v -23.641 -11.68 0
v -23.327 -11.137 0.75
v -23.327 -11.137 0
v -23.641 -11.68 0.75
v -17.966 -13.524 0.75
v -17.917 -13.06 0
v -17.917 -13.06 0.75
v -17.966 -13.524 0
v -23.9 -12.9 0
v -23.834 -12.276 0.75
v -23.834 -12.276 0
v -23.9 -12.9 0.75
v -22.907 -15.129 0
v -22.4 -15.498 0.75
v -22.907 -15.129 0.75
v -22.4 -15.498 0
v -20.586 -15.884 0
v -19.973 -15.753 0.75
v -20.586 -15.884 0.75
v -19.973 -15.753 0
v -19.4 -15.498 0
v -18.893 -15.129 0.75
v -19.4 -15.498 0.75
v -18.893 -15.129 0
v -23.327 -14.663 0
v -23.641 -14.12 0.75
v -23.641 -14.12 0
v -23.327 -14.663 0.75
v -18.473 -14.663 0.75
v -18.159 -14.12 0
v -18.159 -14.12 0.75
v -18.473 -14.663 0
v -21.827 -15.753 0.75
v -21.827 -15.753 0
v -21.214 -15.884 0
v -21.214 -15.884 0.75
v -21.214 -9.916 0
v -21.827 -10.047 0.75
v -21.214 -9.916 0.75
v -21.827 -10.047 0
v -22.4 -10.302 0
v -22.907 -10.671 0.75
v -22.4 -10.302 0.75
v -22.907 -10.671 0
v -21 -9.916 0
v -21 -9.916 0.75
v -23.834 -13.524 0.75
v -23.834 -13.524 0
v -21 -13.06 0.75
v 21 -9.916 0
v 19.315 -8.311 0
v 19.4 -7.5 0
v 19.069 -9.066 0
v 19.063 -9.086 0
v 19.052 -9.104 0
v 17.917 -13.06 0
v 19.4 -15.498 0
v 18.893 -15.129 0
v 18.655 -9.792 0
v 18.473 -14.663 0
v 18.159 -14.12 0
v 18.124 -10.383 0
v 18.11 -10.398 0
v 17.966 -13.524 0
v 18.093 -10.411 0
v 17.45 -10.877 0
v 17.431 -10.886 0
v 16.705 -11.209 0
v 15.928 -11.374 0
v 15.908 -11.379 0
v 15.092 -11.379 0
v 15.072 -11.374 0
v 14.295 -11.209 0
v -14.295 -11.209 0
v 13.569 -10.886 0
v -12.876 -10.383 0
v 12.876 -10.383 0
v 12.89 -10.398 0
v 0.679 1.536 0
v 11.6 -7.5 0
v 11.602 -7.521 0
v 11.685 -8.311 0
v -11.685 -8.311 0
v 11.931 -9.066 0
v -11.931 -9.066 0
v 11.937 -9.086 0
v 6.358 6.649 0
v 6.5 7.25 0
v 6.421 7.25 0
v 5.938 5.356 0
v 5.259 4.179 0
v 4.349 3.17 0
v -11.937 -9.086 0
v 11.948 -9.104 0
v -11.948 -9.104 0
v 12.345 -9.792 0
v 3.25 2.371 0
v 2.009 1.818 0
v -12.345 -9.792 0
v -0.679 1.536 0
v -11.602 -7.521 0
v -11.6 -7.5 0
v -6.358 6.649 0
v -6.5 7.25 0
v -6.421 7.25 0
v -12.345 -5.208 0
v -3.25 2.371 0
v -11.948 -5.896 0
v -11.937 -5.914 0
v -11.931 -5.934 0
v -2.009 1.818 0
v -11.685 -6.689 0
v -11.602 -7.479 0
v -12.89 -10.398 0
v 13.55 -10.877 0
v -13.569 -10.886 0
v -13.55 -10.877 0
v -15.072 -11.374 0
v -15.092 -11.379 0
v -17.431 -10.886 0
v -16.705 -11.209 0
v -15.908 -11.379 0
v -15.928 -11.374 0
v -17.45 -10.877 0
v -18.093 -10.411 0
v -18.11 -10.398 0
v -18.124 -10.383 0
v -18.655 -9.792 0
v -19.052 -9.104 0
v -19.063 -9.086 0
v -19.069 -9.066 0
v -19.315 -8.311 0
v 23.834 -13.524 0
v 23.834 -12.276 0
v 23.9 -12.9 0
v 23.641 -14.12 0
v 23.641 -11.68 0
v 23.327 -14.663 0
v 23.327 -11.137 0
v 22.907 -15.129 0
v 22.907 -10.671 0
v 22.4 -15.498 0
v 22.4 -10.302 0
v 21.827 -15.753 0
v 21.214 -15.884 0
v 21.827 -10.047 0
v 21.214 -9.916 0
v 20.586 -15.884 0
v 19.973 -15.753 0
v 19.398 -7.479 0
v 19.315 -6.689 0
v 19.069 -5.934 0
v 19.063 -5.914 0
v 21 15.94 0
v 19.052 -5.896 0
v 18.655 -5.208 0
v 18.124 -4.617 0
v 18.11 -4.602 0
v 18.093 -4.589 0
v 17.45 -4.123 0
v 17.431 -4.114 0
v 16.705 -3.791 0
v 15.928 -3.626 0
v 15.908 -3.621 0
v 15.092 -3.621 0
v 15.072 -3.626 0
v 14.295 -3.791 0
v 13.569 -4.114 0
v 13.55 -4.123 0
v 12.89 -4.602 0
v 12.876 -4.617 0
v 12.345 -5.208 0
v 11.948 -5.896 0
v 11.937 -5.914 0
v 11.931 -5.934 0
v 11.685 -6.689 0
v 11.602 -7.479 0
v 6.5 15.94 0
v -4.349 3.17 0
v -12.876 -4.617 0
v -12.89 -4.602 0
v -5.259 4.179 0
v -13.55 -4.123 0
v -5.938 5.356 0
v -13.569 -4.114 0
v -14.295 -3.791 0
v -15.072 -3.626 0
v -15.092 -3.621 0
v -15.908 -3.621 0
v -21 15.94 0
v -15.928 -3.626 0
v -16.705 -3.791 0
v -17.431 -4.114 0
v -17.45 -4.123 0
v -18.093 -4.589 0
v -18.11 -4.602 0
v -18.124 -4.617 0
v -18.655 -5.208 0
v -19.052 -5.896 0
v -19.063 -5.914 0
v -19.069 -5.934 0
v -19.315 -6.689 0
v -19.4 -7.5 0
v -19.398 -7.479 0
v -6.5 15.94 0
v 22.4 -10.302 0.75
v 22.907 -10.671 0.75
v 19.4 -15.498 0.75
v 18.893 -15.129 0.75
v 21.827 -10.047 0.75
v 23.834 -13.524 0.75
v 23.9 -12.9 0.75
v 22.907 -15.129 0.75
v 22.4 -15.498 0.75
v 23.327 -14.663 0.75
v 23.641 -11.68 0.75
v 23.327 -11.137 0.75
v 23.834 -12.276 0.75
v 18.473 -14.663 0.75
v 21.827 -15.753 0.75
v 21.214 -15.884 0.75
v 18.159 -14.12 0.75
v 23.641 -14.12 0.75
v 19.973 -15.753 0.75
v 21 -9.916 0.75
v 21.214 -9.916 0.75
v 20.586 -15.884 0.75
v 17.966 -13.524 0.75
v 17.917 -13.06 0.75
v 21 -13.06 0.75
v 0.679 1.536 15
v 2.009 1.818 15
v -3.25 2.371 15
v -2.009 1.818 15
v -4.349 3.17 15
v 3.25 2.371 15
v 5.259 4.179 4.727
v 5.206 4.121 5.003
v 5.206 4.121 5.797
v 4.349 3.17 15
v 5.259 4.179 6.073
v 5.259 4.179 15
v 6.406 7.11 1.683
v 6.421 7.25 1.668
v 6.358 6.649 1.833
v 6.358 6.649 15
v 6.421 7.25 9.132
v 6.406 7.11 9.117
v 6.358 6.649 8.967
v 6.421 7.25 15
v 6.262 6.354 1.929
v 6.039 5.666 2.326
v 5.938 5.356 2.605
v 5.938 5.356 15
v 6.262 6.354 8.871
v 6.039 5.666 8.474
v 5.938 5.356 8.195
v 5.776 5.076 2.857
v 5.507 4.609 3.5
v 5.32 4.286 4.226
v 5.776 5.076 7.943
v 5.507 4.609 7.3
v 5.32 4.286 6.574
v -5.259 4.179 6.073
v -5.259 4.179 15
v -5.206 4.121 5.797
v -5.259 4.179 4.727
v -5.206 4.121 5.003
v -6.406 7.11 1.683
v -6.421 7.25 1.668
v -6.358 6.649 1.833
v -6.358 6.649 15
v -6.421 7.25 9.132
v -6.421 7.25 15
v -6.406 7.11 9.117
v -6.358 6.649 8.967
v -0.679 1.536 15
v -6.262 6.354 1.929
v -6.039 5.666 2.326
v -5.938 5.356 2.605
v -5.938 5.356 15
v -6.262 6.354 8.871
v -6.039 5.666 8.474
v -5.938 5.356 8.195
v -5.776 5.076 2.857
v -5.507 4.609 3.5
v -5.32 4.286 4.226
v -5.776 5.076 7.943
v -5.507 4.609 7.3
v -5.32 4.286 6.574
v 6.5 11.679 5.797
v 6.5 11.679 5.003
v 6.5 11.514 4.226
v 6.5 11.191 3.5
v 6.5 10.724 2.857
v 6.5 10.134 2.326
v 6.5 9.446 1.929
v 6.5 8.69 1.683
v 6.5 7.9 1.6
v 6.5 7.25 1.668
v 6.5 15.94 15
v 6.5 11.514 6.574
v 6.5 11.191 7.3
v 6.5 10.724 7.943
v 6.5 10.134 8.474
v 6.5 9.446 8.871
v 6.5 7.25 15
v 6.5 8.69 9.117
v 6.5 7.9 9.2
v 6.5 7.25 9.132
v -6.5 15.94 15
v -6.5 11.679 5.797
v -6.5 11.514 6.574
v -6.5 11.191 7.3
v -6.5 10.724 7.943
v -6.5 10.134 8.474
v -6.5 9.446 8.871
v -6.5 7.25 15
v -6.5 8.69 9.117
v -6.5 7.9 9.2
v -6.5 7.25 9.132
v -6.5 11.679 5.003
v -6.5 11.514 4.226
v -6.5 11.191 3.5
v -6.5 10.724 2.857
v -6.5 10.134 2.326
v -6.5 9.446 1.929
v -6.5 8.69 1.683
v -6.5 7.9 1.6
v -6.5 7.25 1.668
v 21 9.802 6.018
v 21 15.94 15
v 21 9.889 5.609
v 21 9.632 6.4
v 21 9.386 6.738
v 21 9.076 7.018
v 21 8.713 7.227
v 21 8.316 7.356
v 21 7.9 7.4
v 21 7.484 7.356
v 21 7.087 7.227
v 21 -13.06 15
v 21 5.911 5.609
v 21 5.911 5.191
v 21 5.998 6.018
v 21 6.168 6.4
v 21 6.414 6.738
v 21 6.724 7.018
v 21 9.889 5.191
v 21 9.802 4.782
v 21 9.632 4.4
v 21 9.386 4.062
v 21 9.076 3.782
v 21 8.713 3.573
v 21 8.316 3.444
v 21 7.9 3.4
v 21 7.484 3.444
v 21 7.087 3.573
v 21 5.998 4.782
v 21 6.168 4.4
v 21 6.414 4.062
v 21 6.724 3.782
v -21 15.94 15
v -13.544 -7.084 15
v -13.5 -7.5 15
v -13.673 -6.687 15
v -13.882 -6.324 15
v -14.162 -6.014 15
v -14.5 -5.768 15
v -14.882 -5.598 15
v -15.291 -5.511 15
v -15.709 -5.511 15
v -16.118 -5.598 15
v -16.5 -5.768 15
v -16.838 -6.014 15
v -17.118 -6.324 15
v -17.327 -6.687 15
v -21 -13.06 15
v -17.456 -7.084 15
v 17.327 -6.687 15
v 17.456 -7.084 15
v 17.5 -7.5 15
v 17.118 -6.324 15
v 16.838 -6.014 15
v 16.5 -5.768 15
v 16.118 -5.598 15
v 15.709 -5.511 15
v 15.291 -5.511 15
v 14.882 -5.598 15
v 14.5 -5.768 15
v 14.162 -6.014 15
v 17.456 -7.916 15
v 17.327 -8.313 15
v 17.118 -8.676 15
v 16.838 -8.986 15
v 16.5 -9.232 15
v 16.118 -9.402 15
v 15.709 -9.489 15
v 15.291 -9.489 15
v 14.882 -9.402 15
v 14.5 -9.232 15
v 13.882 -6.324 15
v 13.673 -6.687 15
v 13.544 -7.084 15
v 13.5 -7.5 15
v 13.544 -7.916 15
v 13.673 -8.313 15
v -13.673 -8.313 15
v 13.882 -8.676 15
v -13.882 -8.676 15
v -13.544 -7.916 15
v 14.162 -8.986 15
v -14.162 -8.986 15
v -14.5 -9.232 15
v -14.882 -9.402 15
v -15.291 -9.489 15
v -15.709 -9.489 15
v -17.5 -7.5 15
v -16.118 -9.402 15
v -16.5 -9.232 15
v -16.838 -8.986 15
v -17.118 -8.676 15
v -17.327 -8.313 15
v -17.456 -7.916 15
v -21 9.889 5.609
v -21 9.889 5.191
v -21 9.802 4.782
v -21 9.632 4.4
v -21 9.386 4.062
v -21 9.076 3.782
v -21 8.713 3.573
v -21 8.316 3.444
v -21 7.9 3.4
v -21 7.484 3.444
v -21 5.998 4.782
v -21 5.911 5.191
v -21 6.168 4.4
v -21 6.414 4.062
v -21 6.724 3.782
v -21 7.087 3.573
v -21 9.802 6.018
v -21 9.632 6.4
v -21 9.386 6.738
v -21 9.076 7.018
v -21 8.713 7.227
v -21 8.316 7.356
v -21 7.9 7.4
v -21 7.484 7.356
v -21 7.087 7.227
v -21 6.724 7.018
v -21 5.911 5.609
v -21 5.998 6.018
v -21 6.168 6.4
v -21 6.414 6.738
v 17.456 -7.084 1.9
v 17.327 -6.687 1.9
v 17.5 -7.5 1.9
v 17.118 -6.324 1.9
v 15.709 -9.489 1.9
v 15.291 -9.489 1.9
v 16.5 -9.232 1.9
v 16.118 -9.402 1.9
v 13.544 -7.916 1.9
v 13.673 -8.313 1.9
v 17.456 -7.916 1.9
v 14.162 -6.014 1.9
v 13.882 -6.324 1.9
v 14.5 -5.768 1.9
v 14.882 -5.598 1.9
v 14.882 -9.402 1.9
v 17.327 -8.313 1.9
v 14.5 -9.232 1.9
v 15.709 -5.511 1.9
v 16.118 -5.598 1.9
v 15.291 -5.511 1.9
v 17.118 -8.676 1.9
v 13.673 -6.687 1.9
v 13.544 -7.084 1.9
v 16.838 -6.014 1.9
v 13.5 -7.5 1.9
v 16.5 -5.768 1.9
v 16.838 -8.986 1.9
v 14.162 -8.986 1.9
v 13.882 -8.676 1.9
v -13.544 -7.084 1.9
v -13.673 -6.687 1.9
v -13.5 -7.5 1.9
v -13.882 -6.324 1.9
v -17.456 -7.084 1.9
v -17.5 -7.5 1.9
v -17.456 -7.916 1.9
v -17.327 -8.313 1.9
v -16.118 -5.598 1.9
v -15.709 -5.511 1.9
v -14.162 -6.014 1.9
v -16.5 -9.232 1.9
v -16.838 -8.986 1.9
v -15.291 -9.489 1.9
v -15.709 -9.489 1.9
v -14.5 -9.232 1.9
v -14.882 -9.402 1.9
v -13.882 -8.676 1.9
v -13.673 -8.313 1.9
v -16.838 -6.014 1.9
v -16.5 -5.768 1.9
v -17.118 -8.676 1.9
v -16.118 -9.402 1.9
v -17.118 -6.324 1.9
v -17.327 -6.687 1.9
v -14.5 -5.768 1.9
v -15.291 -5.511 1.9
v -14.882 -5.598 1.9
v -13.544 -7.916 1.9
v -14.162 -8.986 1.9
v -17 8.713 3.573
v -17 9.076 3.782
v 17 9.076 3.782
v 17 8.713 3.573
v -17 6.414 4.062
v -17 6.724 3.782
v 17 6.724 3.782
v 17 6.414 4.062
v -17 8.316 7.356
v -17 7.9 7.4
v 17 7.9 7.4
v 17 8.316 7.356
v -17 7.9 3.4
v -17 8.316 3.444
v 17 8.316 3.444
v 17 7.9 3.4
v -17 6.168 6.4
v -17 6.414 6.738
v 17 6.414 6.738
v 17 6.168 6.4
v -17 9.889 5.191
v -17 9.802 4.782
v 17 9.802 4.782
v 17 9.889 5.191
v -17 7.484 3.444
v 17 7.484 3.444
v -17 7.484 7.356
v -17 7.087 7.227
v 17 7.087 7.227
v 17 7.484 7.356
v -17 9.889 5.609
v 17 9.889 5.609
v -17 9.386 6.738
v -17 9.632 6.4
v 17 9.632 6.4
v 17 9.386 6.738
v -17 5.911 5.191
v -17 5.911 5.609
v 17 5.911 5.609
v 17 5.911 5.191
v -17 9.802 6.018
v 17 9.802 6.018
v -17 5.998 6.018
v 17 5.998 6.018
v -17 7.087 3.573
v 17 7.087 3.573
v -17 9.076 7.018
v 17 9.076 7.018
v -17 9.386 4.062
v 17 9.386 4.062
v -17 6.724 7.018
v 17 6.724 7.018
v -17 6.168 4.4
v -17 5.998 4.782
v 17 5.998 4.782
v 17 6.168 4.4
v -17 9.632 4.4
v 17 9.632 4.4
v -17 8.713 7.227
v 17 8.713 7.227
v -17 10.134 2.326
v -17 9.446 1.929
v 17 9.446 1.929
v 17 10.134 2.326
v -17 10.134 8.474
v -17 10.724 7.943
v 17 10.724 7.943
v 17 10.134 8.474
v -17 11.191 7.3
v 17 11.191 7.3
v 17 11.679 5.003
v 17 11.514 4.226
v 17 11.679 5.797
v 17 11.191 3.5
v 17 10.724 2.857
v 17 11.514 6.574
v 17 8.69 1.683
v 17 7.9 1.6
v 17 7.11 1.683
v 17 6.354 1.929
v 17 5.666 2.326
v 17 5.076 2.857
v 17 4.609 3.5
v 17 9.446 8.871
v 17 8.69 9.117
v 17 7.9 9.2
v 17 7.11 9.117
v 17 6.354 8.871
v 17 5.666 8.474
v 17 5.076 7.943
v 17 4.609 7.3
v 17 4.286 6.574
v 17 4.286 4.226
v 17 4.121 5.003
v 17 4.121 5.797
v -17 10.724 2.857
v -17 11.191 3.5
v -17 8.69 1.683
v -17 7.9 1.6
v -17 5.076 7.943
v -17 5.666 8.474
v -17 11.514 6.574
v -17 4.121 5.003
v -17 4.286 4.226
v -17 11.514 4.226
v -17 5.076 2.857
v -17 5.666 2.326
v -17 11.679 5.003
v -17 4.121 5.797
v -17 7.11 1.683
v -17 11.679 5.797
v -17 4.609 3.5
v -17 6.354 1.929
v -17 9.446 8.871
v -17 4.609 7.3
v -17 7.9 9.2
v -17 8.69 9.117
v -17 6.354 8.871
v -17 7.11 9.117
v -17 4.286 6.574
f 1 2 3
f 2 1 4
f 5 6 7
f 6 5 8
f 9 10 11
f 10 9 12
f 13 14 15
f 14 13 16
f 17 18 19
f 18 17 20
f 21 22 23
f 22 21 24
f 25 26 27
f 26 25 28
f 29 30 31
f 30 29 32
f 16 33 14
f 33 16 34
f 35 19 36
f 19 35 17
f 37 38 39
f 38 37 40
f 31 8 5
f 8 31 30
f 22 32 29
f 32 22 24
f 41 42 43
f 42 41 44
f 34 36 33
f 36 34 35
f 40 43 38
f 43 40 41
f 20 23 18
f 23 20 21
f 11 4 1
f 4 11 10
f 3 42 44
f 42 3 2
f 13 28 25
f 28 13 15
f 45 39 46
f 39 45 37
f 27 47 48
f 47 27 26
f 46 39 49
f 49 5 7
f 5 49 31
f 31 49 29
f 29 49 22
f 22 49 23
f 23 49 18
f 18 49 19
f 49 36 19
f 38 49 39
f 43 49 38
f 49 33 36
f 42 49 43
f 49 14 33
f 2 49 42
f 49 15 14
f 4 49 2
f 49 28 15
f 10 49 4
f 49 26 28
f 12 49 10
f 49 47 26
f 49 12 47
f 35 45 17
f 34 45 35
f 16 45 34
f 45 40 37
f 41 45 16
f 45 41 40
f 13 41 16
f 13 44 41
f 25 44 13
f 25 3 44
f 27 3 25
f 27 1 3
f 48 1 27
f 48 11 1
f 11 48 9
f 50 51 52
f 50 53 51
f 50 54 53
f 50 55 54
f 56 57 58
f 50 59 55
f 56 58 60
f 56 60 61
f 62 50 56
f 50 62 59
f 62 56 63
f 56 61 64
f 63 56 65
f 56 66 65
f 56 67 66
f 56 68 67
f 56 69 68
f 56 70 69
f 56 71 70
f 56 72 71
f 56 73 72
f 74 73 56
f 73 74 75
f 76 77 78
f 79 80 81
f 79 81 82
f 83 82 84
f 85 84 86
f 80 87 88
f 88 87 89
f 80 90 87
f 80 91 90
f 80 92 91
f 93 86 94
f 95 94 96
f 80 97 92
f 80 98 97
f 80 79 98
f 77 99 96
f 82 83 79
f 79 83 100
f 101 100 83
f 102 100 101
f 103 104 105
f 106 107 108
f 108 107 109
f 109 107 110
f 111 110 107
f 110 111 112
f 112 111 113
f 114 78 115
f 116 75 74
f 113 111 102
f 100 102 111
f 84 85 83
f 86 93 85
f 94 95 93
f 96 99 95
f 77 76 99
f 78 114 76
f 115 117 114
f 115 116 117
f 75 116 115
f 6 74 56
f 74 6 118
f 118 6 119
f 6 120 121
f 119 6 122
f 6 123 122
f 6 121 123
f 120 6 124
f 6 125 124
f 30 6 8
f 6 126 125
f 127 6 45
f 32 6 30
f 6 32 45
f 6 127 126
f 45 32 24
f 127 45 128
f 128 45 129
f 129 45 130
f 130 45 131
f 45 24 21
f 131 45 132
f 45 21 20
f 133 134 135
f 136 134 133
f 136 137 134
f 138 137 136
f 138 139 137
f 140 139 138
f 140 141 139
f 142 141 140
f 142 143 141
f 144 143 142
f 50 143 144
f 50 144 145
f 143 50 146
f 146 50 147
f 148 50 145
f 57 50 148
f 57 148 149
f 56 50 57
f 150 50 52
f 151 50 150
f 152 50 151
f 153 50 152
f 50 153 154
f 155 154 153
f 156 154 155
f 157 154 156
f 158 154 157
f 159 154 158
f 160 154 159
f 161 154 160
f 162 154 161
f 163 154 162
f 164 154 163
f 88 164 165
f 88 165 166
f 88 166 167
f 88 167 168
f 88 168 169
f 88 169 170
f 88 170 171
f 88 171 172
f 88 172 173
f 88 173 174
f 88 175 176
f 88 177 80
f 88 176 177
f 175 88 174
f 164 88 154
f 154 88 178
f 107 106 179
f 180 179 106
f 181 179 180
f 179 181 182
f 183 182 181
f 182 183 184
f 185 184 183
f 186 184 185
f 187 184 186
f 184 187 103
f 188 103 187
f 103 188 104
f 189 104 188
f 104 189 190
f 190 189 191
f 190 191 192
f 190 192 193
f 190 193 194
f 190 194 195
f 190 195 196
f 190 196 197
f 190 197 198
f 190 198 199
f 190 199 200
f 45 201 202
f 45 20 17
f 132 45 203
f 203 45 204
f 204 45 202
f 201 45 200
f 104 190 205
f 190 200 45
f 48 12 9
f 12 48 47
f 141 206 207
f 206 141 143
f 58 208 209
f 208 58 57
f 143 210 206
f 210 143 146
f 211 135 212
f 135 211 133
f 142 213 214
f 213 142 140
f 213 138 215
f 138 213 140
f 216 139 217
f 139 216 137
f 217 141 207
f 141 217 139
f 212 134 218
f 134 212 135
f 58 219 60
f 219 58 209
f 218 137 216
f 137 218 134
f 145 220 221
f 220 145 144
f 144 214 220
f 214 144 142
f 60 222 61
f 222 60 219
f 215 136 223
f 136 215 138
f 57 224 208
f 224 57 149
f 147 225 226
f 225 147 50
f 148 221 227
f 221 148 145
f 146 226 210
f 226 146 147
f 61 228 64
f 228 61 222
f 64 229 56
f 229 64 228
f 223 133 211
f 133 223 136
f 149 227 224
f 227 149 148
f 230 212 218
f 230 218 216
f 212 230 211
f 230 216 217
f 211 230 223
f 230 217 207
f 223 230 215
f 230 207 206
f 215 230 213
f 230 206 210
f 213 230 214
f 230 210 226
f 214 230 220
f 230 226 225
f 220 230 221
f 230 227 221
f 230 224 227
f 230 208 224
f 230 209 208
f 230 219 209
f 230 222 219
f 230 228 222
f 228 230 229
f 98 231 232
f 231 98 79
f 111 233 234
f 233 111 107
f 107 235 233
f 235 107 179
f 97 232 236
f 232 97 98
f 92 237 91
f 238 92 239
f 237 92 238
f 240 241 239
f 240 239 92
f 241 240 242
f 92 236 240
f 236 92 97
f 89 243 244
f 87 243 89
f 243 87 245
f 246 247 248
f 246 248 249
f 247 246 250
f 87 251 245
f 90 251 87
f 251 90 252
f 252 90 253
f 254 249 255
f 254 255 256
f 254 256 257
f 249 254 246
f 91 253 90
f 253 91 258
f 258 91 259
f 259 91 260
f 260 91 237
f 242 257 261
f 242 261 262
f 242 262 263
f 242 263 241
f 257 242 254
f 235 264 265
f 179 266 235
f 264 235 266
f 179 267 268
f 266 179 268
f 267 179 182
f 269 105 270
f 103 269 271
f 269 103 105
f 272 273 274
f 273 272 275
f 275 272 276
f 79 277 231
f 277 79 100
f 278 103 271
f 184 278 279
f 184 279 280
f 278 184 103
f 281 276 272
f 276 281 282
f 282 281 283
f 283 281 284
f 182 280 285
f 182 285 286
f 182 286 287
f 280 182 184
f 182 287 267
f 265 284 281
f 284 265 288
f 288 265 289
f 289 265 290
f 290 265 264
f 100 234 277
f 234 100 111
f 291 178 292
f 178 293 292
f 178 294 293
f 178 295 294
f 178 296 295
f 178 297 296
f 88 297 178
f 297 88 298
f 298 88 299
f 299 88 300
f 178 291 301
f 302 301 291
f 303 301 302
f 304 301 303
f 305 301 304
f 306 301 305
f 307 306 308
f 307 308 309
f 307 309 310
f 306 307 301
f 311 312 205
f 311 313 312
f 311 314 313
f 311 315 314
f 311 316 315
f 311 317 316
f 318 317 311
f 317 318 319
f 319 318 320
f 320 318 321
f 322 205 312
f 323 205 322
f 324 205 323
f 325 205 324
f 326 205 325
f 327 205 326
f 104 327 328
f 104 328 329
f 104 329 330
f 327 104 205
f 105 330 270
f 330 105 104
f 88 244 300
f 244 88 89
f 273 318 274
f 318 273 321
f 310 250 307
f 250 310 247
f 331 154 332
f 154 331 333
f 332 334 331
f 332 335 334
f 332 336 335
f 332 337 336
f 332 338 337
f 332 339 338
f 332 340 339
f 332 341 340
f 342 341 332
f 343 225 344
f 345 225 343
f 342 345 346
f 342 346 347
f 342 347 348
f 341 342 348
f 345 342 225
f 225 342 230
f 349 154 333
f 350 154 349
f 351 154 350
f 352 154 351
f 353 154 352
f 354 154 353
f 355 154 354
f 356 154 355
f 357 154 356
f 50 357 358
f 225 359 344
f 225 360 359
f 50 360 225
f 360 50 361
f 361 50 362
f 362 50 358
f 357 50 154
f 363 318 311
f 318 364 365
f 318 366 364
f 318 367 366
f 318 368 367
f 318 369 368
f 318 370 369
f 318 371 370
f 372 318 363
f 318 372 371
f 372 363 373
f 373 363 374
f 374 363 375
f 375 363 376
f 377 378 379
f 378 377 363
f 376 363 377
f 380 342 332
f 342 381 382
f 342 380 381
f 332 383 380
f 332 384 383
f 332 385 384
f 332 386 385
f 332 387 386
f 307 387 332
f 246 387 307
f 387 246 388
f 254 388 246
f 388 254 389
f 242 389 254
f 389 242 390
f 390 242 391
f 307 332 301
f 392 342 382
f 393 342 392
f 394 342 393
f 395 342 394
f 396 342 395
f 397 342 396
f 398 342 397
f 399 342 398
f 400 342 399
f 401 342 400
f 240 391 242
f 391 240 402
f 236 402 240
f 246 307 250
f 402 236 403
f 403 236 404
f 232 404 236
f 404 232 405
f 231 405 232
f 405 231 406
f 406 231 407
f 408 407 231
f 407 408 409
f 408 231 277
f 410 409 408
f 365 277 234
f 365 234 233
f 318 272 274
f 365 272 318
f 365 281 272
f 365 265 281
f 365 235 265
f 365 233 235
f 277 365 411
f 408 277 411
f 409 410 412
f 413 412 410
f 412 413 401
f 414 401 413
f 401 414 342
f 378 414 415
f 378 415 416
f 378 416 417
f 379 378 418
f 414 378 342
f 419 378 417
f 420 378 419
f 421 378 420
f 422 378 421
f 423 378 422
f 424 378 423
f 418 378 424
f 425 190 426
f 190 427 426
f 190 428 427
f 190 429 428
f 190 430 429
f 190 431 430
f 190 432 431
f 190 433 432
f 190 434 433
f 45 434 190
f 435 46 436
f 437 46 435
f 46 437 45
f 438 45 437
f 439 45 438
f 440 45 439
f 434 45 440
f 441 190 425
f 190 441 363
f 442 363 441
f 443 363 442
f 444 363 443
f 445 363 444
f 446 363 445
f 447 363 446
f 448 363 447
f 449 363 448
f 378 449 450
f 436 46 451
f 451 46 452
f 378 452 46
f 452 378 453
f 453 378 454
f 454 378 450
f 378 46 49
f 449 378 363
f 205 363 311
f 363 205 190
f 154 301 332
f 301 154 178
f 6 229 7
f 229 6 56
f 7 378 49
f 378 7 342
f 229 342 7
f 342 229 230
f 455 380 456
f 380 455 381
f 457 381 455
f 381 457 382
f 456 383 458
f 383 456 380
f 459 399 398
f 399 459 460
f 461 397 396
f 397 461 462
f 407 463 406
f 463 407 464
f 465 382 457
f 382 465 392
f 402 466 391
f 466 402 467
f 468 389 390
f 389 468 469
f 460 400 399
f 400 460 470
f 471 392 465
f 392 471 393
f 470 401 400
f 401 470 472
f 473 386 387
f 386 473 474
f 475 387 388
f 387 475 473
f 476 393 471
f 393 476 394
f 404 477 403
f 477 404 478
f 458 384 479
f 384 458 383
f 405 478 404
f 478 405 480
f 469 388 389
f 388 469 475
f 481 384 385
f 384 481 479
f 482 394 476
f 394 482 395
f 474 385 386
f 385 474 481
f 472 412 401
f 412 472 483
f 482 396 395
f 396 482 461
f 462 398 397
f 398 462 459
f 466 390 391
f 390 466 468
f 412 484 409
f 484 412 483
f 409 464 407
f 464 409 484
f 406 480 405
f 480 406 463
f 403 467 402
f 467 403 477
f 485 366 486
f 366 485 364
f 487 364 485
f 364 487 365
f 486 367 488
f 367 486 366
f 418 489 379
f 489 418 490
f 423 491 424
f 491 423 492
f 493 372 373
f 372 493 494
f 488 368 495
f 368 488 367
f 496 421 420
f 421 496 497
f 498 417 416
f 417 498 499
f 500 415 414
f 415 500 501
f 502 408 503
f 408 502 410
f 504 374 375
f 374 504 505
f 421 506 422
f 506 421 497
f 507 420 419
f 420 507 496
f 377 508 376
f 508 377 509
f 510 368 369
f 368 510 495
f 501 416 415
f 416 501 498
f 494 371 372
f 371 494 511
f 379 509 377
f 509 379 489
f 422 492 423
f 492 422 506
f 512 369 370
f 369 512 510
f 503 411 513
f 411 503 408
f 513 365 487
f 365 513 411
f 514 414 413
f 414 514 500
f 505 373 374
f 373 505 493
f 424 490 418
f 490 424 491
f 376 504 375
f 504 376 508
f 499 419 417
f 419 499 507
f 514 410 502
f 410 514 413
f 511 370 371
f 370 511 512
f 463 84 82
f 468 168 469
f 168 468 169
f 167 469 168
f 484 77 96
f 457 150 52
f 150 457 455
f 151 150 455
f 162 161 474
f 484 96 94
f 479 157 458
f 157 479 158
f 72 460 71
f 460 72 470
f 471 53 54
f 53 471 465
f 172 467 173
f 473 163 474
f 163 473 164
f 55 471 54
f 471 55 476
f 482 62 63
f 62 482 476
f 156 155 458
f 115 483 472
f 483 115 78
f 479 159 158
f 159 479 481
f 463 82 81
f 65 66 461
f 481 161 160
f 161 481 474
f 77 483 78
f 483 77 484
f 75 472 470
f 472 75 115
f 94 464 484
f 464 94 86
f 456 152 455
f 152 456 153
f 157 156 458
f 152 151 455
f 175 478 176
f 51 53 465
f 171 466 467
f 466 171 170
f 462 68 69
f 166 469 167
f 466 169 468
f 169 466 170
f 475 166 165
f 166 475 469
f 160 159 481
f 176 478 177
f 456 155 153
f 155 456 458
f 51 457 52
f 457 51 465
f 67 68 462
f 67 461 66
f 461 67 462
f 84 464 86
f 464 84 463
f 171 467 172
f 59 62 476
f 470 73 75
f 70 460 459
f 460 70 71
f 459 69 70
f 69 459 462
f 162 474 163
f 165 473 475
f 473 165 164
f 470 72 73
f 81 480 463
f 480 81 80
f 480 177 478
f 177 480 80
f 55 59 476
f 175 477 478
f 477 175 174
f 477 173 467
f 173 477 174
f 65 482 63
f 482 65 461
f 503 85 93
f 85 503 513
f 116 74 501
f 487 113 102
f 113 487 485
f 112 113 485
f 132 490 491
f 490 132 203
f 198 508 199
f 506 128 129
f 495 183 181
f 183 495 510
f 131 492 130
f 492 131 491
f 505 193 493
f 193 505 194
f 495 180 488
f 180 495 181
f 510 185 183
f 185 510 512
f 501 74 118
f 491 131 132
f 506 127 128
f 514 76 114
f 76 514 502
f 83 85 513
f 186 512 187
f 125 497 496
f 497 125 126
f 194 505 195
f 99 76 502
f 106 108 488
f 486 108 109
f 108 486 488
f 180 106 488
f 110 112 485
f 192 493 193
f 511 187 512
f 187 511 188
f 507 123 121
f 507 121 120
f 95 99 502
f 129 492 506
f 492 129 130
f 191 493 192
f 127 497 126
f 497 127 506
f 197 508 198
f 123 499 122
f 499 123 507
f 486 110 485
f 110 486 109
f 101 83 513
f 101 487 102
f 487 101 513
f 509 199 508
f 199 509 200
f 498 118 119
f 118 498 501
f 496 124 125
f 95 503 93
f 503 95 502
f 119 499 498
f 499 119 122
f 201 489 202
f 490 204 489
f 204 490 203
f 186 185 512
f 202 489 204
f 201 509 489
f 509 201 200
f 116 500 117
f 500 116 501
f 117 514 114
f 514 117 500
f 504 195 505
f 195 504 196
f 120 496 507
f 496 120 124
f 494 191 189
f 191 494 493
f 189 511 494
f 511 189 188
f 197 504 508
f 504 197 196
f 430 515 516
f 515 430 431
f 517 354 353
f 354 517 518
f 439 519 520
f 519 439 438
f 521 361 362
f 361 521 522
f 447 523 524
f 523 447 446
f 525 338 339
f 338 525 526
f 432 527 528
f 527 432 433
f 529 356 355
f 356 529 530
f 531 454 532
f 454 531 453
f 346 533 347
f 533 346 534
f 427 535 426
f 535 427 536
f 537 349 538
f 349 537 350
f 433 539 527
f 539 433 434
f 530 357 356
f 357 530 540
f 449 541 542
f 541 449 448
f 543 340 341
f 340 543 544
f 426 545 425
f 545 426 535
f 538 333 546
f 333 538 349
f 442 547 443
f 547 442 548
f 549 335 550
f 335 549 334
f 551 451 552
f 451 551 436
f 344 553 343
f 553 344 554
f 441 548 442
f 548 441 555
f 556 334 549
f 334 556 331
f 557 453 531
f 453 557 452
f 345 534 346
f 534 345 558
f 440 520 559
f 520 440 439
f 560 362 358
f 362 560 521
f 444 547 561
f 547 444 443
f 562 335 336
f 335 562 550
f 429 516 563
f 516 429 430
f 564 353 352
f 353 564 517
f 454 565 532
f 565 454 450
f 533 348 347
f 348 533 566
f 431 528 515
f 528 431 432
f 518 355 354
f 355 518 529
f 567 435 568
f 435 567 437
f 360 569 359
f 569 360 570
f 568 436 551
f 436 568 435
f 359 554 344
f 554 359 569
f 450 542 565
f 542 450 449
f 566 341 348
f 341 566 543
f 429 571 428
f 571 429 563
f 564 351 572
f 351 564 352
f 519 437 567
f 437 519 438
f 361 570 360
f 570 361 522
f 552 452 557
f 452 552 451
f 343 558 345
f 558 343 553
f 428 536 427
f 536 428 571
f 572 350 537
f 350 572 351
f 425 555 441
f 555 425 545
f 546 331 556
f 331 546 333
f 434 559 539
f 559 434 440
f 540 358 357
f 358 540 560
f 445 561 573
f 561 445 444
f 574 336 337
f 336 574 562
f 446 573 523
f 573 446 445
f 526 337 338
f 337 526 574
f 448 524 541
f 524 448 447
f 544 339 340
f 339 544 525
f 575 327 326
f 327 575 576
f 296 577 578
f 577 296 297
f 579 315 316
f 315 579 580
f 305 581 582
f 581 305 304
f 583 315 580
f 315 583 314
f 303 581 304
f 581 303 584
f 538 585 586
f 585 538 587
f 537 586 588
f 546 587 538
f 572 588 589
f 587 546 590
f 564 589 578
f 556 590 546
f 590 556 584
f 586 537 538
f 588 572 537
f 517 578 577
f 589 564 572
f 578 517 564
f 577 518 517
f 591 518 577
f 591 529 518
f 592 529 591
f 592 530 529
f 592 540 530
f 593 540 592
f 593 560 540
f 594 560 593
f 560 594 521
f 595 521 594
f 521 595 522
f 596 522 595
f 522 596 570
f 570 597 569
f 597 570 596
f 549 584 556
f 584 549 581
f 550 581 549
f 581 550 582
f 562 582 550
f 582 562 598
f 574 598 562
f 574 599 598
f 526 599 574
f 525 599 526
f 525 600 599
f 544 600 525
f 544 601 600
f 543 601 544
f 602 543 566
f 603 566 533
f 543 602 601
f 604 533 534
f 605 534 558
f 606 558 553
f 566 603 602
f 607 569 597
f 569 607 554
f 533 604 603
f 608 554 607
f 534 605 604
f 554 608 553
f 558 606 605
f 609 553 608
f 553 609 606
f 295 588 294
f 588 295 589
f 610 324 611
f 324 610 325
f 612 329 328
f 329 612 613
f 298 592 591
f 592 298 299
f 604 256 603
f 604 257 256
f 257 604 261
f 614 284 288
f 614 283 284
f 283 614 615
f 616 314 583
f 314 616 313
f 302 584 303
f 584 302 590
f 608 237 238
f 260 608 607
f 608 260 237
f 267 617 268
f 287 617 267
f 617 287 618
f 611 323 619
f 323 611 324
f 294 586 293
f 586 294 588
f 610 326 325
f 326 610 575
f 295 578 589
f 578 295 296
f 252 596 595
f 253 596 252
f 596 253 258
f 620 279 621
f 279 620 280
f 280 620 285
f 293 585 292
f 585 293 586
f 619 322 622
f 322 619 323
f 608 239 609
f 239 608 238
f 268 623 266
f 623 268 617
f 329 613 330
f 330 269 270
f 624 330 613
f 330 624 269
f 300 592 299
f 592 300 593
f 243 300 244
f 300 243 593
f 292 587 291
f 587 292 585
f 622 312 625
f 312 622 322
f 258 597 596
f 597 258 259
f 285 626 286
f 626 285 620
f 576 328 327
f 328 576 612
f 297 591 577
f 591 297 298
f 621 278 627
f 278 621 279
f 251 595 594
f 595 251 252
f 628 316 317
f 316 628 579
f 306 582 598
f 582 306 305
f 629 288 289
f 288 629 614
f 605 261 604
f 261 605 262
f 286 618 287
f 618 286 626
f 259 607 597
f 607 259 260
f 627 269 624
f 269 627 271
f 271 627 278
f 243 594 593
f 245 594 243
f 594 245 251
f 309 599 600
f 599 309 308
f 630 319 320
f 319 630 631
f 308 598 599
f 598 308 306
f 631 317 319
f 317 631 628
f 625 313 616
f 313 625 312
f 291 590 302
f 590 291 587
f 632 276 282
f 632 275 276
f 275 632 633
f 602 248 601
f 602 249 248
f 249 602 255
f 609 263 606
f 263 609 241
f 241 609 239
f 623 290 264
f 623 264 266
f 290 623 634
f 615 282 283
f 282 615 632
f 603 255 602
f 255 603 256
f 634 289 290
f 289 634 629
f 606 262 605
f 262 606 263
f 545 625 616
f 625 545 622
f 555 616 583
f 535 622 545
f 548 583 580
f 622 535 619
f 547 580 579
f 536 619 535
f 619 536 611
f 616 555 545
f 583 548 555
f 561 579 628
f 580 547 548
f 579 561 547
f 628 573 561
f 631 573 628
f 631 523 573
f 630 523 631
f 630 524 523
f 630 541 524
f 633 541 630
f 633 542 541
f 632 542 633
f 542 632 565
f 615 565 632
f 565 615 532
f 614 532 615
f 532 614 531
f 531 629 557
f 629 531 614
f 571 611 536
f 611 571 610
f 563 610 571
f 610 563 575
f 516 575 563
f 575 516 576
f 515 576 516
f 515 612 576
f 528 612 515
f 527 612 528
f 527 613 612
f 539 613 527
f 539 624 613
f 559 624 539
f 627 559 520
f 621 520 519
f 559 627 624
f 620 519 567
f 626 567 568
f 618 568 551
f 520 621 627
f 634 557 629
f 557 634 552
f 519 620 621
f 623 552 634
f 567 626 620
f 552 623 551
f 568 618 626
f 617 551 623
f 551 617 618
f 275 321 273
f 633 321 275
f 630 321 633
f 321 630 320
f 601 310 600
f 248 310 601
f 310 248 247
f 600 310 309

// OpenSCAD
//import("/home/felipe/Downloads/thingiverse/filament-drive-block.STL");

delta=0.1;
$fn=30;

module MK7_Stepstruder_Filament_Drive_Block(mouse_ears=true){

if(mouse_ears){
	translate([-20.9, -12.9, 0]) cylinder(r=3, h=0.75);
	translate([20.9, -12.9, 0]) cylinder(r=3, h=0.75);	
}

difference(){
	translate([-21, -13.06 ,0]) cube([42, 29, 15]);

	//screw holes
	translate([15.5, -7.5, -delta]) cylinder(r=2, h=15+2*delta);
	translate([-15.5, -7.5, -delta]) cylinder(r=2, h=15+2*delta);

	//screw head bevels
	translate([15.5, -7.5, -delta]) cylinder(r1=4, r2=2, h=2);
	translate([-15.5, -7.5, -delta]) cylinder(r1=4, r2=2, h=2);

	//screw diagonal cuts

	//filament drive holes

	//plunger holes
	translate([-25, 7.9, 5.4]) rotate([0, 90, 0]) cylinder(r=2, h=50);
	translate([-17, 7.9, 5.4]) rotate([0, 90, 0]) cylinder(r=3.8, h=34);

	//pulley hole
	union(){
		translate([0, 8, -delta]) cylinder(r=6.5, h=15+2*delta);
		translate([-6.5, 7.25, -delta]) cube([13, 20, 15+2*delta]);
	}
}
}

MK7_Stepstruder_Filament_Drive_Block();
